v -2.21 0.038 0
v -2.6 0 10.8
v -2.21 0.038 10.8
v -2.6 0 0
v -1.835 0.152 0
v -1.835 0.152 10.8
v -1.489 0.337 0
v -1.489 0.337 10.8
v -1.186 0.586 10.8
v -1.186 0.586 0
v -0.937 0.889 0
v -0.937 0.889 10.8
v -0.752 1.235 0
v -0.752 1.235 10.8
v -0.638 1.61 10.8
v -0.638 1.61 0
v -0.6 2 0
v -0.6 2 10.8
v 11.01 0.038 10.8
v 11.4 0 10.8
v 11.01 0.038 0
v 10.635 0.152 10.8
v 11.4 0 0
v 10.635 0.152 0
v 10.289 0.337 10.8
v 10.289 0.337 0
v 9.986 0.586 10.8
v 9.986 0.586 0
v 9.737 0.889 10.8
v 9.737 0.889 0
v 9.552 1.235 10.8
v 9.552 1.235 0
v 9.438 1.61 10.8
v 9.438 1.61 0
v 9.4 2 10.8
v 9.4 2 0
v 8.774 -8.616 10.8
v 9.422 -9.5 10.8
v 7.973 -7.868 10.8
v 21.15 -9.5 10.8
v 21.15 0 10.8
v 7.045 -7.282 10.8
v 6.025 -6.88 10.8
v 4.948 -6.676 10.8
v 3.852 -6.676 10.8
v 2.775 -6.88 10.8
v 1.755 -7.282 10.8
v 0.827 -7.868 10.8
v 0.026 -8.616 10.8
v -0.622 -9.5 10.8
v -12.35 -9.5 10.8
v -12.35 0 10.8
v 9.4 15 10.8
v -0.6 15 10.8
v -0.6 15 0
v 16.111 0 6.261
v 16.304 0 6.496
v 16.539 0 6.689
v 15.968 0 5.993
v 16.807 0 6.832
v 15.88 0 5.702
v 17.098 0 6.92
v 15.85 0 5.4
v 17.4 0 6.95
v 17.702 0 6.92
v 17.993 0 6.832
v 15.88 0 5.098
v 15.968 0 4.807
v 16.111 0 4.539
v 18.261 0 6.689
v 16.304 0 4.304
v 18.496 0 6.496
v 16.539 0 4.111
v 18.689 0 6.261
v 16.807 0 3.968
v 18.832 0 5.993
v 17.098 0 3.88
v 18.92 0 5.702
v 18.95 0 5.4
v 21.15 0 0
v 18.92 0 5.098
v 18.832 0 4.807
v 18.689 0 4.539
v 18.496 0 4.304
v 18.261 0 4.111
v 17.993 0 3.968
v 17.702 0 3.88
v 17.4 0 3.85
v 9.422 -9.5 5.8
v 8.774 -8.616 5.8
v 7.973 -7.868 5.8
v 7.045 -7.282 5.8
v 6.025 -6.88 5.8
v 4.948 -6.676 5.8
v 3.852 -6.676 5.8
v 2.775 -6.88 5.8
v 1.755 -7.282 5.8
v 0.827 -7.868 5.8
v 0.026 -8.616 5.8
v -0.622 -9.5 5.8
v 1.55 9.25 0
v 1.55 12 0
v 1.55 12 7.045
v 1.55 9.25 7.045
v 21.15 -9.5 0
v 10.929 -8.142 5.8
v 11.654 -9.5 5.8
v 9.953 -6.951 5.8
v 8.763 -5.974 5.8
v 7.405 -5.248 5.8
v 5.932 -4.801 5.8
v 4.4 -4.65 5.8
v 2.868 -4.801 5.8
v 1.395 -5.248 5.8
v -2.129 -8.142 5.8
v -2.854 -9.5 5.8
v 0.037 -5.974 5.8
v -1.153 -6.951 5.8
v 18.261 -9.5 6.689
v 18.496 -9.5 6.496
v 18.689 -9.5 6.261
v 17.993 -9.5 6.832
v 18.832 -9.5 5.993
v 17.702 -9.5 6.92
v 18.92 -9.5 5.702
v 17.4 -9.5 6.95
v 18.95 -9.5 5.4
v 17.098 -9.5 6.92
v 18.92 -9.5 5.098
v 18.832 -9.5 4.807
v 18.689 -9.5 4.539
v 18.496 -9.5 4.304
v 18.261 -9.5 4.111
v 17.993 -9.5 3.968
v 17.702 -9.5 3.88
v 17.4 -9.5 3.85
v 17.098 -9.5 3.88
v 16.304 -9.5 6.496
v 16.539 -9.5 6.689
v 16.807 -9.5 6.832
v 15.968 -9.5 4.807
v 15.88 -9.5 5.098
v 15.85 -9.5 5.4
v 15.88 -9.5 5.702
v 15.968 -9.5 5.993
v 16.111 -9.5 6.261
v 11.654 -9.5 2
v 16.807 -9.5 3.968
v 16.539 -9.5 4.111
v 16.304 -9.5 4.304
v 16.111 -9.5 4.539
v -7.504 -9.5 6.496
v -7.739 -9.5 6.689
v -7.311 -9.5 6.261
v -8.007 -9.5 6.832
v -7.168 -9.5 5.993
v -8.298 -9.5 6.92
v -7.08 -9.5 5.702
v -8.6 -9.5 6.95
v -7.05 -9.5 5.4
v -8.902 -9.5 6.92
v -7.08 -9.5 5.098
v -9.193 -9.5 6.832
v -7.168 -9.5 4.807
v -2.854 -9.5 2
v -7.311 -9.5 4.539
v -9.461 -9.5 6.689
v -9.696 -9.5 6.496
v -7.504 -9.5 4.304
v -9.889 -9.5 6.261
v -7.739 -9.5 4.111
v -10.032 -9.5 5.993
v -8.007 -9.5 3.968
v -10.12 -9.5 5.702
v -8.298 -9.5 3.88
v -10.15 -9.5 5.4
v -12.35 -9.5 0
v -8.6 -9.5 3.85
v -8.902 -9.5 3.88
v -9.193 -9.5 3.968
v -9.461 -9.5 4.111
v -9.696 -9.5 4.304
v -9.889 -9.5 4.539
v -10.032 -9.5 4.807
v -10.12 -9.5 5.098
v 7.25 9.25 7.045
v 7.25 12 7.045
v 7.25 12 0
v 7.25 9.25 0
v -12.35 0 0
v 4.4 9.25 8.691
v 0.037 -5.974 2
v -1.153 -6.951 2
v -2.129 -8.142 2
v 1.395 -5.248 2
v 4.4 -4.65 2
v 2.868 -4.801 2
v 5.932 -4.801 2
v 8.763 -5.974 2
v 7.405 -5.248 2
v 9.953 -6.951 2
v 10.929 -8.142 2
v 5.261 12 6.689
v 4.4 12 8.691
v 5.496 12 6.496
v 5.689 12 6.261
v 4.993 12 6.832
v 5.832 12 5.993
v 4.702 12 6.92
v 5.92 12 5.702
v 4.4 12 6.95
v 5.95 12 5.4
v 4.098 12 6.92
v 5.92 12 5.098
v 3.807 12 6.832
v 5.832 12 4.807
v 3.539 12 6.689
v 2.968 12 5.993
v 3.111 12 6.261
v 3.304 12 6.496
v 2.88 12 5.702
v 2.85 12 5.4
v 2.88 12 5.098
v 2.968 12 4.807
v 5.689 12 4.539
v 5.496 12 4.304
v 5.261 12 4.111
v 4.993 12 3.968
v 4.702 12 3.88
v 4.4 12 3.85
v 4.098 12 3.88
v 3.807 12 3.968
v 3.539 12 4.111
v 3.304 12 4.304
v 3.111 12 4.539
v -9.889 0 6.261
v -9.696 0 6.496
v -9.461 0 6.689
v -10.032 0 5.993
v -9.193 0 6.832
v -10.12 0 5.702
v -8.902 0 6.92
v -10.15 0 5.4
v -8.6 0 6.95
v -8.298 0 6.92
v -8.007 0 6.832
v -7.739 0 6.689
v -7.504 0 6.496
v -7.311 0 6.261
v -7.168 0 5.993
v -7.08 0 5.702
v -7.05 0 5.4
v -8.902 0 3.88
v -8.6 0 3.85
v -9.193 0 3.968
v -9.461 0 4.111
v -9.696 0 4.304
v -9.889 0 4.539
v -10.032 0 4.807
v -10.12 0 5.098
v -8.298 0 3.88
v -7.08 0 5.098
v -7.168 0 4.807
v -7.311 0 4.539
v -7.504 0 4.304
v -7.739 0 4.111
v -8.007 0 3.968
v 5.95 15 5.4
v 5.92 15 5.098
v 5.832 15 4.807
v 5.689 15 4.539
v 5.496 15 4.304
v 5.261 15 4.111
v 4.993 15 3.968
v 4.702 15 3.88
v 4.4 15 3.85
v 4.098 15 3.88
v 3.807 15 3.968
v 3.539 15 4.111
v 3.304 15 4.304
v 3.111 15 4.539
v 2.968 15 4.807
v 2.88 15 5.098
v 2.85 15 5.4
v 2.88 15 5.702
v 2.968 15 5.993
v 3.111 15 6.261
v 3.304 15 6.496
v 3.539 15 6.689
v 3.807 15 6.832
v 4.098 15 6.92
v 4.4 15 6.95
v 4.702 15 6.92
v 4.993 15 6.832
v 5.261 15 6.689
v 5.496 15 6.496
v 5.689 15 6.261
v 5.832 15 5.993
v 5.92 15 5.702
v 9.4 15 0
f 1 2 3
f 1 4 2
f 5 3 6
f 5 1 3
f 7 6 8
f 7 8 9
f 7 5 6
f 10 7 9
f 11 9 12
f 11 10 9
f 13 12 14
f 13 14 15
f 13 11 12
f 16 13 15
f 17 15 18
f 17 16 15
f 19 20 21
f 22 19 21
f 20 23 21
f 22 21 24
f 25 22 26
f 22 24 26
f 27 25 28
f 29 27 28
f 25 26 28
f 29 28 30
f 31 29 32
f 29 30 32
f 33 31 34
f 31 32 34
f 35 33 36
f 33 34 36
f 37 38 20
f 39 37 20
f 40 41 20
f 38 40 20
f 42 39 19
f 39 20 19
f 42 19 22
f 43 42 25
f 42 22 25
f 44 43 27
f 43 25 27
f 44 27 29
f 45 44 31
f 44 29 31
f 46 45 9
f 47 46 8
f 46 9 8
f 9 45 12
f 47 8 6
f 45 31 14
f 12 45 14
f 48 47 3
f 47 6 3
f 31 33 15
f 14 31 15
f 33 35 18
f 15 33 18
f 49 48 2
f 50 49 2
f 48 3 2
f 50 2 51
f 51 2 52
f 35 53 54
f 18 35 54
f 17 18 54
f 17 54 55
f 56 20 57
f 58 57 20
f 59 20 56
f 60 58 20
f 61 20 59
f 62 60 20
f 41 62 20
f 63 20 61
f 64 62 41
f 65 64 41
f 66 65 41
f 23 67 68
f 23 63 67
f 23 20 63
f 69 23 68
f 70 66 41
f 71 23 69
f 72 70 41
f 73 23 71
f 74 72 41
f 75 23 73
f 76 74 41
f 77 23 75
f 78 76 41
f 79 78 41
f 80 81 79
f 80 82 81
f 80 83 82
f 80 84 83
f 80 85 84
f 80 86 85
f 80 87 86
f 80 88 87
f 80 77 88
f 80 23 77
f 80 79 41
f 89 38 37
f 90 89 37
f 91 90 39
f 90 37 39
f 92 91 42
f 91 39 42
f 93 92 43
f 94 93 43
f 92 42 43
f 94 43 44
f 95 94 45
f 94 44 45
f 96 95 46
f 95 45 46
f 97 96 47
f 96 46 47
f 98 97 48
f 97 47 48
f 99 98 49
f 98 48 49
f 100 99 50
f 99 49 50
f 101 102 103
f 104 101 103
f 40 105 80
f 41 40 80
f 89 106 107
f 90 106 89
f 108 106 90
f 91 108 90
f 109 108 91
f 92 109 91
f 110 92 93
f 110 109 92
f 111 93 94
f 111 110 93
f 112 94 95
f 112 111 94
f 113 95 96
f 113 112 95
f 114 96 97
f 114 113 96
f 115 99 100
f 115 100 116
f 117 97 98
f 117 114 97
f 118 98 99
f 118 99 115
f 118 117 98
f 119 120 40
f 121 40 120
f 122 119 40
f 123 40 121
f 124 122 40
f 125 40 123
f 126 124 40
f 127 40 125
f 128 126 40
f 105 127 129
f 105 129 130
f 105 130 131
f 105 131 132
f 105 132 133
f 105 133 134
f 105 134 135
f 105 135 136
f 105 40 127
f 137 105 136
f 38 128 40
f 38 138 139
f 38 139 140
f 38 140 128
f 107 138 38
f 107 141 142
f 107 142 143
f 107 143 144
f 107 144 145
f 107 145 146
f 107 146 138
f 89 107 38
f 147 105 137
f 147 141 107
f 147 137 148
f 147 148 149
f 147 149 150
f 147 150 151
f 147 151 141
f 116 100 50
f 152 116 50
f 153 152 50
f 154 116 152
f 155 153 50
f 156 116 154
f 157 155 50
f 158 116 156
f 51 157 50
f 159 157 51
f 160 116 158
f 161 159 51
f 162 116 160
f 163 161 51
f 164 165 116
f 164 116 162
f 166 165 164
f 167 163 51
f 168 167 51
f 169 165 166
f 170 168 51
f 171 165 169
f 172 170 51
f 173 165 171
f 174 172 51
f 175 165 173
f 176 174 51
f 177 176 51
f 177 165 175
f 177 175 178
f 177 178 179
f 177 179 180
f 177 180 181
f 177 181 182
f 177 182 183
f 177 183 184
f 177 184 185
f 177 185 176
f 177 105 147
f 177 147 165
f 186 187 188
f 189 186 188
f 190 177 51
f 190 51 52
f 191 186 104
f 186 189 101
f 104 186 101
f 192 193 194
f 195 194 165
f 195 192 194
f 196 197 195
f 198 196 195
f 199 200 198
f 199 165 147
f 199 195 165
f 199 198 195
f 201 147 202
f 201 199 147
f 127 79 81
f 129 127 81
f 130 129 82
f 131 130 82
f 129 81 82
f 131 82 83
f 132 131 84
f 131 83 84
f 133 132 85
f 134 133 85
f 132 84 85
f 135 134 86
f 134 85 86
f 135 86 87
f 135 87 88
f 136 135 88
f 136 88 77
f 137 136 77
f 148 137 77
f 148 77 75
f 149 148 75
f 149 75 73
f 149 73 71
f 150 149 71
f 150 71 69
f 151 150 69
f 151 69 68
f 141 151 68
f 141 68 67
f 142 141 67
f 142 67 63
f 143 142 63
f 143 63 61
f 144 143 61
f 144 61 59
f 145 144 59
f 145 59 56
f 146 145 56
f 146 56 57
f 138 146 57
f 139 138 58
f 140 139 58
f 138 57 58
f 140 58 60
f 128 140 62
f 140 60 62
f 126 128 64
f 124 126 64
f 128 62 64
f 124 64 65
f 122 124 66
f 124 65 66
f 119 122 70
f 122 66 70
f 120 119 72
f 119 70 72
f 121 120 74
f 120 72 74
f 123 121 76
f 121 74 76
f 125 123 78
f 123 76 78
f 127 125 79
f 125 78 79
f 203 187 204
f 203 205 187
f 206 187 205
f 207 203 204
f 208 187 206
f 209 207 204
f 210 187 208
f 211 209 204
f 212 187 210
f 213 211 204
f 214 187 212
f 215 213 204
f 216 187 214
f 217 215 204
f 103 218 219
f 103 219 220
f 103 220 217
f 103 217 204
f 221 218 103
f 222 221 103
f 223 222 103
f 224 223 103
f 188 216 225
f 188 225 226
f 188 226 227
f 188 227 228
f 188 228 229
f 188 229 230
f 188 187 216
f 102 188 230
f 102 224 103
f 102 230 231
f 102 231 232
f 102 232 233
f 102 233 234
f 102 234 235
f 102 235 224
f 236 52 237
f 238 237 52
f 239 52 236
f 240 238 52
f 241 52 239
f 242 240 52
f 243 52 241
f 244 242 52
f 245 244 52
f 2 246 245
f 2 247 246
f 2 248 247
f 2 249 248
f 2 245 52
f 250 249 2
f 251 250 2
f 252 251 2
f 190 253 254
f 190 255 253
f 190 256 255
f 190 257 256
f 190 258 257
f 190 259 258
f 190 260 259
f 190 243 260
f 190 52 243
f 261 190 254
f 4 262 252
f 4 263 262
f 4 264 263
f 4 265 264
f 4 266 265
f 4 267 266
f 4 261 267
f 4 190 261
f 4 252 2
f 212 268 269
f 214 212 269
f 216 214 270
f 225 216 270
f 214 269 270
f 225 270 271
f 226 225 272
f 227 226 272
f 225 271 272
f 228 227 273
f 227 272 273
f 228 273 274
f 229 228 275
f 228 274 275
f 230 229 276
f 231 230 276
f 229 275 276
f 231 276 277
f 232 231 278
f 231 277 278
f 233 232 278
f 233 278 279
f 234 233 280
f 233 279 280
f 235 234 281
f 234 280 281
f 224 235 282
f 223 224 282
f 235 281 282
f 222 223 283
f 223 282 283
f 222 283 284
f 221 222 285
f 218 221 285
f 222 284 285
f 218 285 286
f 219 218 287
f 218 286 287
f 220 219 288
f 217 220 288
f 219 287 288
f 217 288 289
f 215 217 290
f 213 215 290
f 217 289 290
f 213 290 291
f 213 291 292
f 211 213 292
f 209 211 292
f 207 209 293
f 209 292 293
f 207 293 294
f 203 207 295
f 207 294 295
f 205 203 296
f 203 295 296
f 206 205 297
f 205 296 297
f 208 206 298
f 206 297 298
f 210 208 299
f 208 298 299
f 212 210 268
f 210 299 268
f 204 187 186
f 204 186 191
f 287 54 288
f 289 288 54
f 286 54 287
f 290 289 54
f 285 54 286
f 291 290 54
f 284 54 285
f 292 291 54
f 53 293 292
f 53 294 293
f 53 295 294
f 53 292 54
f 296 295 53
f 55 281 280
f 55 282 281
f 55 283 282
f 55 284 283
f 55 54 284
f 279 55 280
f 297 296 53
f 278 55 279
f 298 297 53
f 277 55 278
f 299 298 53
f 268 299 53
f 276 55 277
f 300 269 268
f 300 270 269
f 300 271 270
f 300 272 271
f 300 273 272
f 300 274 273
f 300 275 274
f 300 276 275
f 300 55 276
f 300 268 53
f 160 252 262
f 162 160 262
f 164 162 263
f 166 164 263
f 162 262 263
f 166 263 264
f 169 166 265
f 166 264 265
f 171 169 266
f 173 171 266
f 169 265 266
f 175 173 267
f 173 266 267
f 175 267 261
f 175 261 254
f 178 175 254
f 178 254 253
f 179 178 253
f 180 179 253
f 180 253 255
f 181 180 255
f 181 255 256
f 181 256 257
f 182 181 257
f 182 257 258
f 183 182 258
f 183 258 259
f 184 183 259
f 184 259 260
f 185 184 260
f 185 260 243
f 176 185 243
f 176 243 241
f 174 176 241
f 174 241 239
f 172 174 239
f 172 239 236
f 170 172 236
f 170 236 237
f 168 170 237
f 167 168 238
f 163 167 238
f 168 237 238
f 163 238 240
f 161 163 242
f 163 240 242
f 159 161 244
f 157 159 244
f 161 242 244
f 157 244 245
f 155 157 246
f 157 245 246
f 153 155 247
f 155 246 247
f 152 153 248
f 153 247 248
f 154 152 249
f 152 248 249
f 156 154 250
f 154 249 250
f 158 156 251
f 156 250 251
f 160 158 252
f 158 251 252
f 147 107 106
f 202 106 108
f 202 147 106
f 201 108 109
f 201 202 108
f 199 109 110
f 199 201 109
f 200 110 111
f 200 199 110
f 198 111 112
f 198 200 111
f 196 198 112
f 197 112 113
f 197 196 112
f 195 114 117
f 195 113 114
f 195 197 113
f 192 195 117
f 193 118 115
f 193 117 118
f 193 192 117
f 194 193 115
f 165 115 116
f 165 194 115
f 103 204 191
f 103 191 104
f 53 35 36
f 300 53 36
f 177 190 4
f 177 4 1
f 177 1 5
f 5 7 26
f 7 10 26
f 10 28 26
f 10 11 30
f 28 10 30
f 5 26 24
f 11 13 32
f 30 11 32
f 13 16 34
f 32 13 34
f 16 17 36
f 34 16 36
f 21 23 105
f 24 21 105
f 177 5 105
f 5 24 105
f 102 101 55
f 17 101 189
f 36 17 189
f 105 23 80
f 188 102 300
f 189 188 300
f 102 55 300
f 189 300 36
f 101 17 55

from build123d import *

# Parameters (mm, degrees)
SKETCH1_W           = 33.5
SKETCH1_H           = 9.5
BOSS_EXTRUDE1_DEPTH = 10.8
CUT_EXTRUDE1_START  = -5
SKETCH2_R           = 6.05
CUT_EXTRUDE1_DEPTH  = 5
CUT_EXTRUDE2_START  = -3.8
SKETCH4_R           = 8.05
CUT_EXTRUDE2_DEPTH  = 3.8
SKETCH5_R           = 1.55
CUT_EXTRUDE3_DEPTH  = 10.5
SKETCH6_W           = 10
SKETCH6_H           = 10.8
BOSS_EXTRUDE2_DEPTH = 15
SKETCH7_R           = 1.55
CUT_EXTRUDE4_DEPTH  = 3
CUT_EXTRUDE5_DEPTH  = 2.75
FILLET1_R           = 2
BOSS_EXTRUDE3_DEPTH = 5
BOSS_EXTRUDE4_REACH = 10.8


with BuildPart() as part:
    # Sketch1 → Boss-Extrude1 (new body)
    with BuildSketch(Plane.XY):
        with Locations((4.4, -4.75)):
            Rectangle(SKETCH1_W, SKETCH1_H)
    extrude(amount=BOSS_EXTRUDE1_DEPTH)

    # Sketch2 → Cut-Extrude1 (cut)
    with BuildSketch(Plane.XY.offset(10.8).offset(CUT_EXTRUDE1_START)):
        with Locations((4.4, -12.5)):
            Circle(SKETCH2_R)
    extrude(amount=CUT_EXTRUDE1_DEPTH, mode=Mode.SUBTRACT)

    # Sketch4 → Cut-Extrude2 (cut)
    with BuildSketch(Plane.XY.offset(5.8).offset(CUT_EXTRUDE2_START)):
        with Locations((4.4, -12.5)):
            Circle(SKETCH4_R)
    extrude(amount=CUT_EXTRUDE2_DEPTH, mode=Mode.SUBTRACT)

    # Sketch5 → Cut-Extrude3 (cut, through all)
    with BuildSketch(Plane(origin=(0, 0, 0), x_dir=(1, 0, 0), z_dir=(0, 1, 0))):
        with Locations((17.4, -5.4)):
            Circle(SKETCH5_R)
        with Locations((-8.6, -5.4)):
            Circle(SKETCH5_R)
    extrude(amount=-CUT_EXTRUDE3_DEPTH, mode=Mode.SUBTRACT)

    # Sketch6 → Boss-Extrude2 (add)
    with BuildSketch(Plane(origin=(0, 0, 0), x_dir=(1, 0, 0), z_dir=(0, 1, 0))):
        with Locations((4.4, -5.4)):
            Rectangle(SKETCH6_W, SKETCH6_H)
    extrude(amount=BOSS_EXTRUDE2_DEPTH)

    # Sketch7 → Cut-Extrude4 (cut)
    with BuildSketch(Plane(origin=(0, 15, 0), x_dir=(1, 0, 0), z_dir=(0, 1, 0))):
        with Locations((4.4, -5.4)):
            Circle(SKETCH7_R)
    extrude(amount=-CUT_EXTRUDE4_DEPTH, mode=Mode.SUBTRACT)

    # Sketch8 → Cut-Extrude5 (cut)
    with BuildSketch(Plane(origin=(0, 12, 0), x_dir=(1, 0, 0), z_dir=(0, 1, 0))):
        Polygon((1.55, 0), (7.25, 0), (7.25, -3.754551733), (7.25, -7.045448267), (4.4, -8.690896534), (1.55, -7.045448267), (1.55, -3.754551733), align=None)
    extrude(amount=-CUT_EXTRUDE5_DEPTH, mode=Mode.SUBTRACT)

    # Fillet1
    fillet1_edges = [part.edges().sort_by_distance(p)[0] for p in [
        (9.4, 0, 5.4),
        (-0.6, 0, 5.4),
    ]]
    fillet(fillet1_edges, radius=FILLET1_R)

    # Sketch9 → Boss-Extrude3 (add)
    with BuildSketch(Plane.XY.offset(10.8)):
        with BuildLine():
            Line((9.653808143, -9.5), (9.422200713, -9.5))
            ThreePointArc((9.422200713, -9.5), (4.4, -6.65), (-0.622200713, -9.5))
            Line((-0.622200713, -9.5), (-0.853808143, -9.5))
            ThreePointArc((-0.853808143, -9.5), (4.4, -6.45), (9.653808143, -9.5))
        make_face()
    extrude(amount=-BOSS_EXTRUDE3_DEPTH)

    # Sketch10 → Boss-Extrude4 (add, up to next)
    with BuildSketch(Plane.XY.offset(2), mode=Mode.PRIVATE) as boss_extrude4_sk1:
        with BuildLine():
            Line((11.870107094, -9.5), (11.654136751, -9.5))
            ThreePointArc((11.654136751, -9.5), (4.4, -4.65), (-2.854136751, -9.5))
            Line((-2.854136751, -9.5), (-3.070107094, -9.5))
            ThreePointArc((-3.070107094, -9.5), (4.4, -4.45), (11.870107094, -9.5))
        make_face()
    boss_extrude4_tool1 = extrude(boss_extrude4_sk1.sketch, amount=BOSS_EXTRUDE4_REACH, mode=Mode.PRIVATE) - part.part
    add(boss_extrude4_tool1.solids().sort_by_distance((11.762122, -9.342294, 2))[0])


solid = part.part
